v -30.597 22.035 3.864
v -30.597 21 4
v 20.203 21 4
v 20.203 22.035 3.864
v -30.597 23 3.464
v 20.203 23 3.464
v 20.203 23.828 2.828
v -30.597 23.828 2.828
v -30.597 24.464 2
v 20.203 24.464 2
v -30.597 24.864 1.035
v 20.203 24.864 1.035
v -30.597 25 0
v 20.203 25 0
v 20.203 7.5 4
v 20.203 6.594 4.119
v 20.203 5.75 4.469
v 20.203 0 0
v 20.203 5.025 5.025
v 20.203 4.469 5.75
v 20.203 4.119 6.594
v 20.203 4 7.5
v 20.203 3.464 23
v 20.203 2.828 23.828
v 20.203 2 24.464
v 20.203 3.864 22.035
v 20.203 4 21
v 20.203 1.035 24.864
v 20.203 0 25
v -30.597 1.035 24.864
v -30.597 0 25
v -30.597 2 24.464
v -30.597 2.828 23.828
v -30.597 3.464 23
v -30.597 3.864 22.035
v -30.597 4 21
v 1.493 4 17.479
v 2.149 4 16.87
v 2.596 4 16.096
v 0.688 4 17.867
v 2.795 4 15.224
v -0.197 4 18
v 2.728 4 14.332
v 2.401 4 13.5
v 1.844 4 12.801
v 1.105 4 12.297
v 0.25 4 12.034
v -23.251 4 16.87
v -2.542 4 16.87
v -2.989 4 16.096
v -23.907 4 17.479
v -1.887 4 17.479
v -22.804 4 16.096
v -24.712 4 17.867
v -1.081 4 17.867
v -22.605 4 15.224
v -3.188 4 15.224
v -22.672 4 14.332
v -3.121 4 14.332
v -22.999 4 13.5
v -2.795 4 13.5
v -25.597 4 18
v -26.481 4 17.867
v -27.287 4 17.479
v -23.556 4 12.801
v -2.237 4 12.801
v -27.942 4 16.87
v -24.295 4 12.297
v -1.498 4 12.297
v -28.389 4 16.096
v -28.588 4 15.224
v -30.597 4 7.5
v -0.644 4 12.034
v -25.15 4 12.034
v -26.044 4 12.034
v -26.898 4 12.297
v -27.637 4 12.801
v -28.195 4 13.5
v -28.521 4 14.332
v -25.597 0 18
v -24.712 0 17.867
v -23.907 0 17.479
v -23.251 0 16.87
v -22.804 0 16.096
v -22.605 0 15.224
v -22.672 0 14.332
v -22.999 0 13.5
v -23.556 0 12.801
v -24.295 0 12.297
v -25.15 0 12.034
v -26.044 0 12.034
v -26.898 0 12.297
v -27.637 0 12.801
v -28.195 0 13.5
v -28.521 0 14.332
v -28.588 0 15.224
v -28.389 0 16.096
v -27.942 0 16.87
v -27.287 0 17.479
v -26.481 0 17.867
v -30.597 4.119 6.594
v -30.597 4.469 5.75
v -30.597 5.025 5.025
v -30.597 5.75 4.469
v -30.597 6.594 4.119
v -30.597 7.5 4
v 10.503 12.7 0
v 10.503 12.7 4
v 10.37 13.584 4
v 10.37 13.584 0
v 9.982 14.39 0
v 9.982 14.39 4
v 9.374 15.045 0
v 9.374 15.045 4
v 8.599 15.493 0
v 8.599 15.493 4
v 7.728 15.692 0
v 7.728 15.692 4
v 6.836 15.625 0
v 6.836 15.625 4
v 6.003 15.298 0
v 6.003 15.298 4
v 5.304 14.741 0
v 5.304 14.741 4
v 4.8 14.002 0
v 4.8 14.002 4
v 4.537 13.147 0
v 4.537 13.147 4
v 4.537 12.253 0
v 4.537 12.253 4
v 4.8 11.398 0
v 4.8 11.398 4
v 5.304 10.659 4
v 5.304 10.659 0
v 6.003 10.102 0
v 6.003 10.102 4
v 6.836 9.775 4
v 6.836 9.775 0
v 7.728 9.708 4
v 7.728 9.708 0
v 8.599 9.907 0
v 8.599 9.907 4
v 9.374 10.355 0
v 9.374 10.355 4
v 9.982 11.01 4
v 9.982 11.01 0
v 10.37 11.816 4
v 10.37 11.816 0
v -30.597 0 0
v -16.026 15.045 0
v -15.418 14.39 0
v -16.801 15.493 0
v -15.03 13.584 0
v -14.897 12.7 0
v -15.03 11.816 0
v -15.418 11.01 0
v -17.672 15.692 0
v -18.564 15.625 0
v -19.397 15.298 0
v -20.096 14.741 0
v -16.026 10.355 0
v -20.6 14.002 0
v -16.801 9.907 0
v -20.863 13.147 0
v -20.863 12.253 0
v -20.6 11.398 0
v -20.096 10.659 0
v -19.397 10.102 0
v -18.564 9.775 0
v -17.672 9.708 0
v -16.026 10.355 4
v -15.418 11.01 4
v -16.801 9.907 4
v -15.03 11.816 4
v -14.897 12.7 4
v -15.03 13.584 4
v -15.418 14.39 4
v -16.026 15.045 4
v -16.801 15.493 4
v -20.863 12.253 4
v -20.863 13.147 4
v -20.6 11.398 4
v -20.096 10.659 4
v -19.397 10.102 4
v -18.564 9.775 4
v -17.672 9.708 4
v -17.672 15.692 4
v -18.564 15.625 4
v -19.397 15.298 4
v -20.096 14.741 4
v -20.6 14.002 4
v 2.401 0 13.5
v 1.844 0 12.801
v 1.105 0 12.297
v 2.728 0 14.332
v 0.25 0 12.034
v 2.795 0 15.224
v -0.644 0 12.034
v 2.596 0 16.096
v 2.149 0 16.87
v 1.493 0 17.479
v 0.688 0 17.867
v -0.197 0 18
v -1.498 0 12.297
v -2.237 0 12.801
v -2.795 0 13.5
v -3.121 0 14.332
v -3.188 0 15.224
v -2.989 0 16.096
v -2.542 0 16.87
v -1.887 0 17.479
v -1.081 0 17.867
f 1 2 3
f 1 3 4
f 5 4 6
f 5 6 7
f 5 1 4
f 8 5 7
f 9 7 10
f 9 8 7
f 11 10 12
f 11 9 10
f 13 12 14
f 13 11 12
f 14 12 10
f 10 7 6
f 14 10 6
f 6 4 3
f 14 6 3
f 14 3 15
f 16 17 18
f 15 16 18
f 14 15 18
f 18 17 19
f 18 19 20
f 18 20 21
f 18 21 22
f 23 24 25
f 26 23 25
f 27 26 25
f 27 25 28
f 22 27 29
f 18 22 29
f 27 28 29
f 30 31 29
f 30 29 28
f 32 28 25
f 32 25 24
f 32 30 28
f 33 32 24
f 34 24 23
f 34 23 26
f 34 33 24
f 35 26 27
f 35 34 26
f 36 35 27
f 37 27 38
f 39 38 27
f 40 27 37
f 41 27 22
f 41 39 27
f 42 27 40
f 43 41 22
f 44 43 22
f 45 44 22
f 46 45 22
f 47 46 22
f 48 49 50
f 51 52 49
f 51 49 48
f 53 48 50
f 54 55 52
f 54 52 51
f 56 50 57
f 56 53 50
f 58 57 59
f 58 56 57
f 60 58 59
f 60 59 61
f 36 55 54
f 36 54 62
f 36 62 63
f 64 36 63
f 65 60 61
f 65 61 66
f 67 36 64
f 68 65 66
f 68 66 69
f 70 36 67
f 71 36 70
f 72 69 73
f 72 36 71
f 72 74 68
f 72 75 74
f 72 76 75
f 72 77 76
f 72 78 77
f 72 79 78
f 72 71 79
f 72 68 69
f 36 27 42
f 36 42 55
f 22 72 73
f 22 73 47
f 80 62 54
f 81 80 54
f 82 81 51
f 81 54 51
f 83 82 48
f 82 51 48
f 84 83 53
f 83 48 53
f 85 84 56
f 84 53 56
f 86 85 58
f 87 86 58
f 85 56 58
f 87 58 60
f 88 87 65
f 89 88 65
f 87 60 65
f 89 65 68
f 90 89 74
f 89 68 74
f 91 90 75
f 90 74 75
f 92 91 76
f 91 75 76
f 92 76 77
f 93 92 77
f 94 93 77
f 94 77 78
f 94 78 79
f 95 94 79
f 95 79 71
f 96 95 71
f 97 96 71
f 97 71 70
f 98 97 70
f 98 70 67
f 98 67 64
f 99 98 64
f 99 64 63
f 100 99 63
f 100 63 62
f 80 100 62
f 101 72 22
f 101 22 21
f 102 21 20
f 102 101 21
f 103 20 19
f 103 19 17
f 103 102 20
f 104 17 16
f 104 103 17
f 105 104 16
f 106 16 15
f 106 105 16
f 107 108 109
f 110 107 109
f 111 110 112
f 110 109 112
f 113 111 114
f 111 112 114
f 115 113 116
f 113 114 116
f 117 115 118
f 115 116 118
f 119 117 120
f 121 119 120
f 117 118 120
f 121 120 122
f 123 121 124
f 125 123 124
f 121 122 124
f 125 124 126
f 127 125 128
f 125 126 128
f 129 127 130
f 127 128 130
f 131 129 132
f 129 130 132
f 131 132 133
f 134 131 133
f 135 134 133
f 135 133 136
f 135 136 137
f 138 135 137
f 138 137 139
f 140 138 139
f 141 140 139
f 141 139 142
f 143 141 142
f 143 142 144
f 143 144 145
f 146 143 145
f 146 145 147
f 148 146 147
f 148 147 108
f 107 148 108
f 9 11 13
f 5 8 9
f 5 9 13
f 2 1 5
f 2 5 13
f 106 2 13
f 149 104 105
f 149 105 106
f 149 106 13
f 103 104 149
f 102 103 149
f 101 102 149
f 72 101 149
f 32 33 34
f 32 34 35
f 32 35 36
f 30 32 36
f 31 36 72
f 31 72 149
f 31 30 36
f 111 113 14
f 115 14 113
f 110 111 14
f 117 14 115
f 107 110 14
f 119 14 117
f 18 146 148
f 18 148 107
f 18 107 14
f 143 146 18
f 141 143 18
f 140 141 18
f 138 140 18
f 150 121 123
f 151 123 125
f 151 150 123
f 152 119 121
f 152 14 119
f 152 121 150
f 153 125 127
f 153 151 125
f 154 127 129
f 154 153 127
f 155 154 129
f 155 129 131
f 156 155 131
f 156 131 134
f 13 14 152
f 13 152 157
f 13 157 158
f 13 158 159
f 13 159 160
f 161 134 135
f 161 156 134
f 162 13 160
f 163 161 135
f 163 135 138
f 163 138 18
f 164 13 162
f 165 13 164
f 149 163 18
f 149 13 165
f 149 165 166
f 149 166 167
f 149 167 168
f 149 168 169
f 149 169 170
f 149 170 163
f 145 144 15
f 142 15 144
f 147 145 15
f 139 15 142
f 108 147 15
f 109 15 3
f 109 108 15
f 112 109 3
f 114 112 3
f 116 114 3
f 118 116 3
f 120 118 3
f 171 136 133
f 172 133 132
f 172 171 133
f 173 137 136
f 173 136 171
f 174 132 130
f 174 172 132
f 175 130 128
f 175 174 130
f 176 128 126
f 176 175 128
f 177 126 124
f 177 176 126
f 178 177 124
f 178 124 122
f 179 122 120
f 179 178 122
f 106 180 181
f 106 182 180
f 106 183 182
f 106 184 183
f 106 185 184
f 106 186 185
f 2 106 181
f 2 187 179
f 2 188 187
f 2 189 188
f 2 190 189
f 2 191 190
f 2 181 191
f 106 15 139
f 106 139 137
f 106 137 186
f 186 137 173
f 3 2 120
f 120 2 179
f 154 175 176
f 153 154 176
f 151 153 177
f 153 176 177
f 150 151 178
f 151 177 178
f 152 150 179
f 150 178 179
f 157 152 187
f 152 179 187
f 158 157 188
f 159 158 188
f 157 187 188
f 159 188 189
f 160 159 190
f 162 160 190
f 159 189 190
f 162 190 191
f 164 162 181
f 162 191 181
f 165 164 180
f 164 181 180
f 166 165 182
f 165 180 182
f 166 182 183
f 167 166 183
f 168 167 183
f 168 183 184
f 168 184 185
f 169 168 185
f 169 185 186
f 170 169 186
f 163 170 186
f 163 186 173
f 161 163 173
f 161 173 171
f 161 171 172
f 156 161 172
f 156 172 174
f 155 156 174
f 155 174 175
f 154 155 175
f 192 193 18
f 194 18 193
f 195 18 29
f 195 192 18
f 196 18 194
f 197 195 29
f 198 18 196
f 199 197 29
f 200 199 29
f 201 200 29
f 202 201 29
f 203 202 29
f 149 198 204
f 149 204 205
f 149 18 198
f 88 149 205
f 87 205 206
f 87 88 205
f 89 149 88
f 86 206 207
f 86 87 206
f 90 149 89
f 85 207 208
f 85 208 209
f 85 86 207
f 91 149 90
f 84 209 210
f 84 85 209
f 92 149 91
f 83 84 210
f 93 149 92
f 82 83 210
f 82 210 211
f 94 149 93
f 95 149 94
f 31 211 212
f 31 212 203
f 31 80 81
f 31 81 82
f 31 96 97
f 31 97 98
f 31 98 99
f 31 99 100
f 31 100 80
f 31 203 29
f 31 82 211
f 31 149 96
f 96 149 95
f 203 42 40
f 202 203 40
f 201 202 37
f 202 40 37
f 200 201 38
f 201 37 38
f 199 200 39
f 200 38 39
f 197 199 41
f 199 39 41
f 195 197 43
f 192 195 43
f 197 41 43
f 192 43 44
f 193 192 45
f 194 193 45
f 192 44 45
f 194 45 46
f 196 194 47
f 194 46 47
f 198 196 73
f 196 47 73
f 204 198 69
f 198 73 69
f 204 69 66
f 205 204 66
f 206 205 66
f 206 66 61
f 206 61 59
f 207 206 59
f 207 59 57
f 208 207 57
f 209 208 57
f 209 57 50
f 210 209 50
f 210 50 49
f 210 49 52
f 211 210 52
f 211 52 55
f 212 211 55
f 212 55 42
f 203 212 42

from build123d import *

# Parameters (mm, degrees)
STRUCTURAL_MEMBER1_DEPTH = 50.8
SKETCH13_R               = 3
CUT_EXTRUDE1_DEPTH       = 45.745454998
SKETCH14_R               = 3
CUT_EXTRUDE2_DEPTH       = 45.745454998


with BuildPart() as part:
    # Sketch12 → Structural Member1 (new body)
    with BuildSketch(Plane.YZ.offset(-30.596662285)):
        with BuildLine():
            Line((0, 0), (0, 25))
            ThreePointArc((0, 25), (2.828427125, 23.828427125), (4, 21))
            Line((4, 21), (4, 7.5))
            ThreePointArc((4, 7.5), (5.025126266, 5.025126266), (7.5, 4))
            Line((7.5, 4), (21, 4))
            ThreePointArc((21, 4), (23.828427125, 2.828427125), (25, 0))
            Line((25, 0), (0, 0))
        make_face()
    extrude(amount=STRUCTURAL_MEMBER1_DEPTH)

    # Sketch13 → Cut-Extrude1 (cut, through all)
    with BuildSketch(Plane.XY.offset(4)):
        with Locations((-17.896662285, 12.7)):
            Circle(SKETCH13_R)
        with Locations((7.503337715, 12.7)):
            Circle(SKETCH13_R)
    extrude(amount=-CUT_EXTRUDE1_DEPTH, mode=Mode.SUBTRACT)

    # Sketch14 → Cut-Extrude2 (cut, through all)
    with BuildSketch(Plane(origin=(0, 4, 0), x_dir=(-1, 0, 0), z_dir=(0, 1, 0))):
        with Locations(Location((25.596662285, 15, 0), (0, 0, 90))):
            Circle(SKETCH14_R)
        with Locations(Location((0.196662285, 15, 0), (0, 0, 90))):
            Circle(SKETCH14_R)
    extrude(amount=-CUT_EXTRUDE2_DEPTH, mode=Mode.SUBTRACT)


solid = part.part
